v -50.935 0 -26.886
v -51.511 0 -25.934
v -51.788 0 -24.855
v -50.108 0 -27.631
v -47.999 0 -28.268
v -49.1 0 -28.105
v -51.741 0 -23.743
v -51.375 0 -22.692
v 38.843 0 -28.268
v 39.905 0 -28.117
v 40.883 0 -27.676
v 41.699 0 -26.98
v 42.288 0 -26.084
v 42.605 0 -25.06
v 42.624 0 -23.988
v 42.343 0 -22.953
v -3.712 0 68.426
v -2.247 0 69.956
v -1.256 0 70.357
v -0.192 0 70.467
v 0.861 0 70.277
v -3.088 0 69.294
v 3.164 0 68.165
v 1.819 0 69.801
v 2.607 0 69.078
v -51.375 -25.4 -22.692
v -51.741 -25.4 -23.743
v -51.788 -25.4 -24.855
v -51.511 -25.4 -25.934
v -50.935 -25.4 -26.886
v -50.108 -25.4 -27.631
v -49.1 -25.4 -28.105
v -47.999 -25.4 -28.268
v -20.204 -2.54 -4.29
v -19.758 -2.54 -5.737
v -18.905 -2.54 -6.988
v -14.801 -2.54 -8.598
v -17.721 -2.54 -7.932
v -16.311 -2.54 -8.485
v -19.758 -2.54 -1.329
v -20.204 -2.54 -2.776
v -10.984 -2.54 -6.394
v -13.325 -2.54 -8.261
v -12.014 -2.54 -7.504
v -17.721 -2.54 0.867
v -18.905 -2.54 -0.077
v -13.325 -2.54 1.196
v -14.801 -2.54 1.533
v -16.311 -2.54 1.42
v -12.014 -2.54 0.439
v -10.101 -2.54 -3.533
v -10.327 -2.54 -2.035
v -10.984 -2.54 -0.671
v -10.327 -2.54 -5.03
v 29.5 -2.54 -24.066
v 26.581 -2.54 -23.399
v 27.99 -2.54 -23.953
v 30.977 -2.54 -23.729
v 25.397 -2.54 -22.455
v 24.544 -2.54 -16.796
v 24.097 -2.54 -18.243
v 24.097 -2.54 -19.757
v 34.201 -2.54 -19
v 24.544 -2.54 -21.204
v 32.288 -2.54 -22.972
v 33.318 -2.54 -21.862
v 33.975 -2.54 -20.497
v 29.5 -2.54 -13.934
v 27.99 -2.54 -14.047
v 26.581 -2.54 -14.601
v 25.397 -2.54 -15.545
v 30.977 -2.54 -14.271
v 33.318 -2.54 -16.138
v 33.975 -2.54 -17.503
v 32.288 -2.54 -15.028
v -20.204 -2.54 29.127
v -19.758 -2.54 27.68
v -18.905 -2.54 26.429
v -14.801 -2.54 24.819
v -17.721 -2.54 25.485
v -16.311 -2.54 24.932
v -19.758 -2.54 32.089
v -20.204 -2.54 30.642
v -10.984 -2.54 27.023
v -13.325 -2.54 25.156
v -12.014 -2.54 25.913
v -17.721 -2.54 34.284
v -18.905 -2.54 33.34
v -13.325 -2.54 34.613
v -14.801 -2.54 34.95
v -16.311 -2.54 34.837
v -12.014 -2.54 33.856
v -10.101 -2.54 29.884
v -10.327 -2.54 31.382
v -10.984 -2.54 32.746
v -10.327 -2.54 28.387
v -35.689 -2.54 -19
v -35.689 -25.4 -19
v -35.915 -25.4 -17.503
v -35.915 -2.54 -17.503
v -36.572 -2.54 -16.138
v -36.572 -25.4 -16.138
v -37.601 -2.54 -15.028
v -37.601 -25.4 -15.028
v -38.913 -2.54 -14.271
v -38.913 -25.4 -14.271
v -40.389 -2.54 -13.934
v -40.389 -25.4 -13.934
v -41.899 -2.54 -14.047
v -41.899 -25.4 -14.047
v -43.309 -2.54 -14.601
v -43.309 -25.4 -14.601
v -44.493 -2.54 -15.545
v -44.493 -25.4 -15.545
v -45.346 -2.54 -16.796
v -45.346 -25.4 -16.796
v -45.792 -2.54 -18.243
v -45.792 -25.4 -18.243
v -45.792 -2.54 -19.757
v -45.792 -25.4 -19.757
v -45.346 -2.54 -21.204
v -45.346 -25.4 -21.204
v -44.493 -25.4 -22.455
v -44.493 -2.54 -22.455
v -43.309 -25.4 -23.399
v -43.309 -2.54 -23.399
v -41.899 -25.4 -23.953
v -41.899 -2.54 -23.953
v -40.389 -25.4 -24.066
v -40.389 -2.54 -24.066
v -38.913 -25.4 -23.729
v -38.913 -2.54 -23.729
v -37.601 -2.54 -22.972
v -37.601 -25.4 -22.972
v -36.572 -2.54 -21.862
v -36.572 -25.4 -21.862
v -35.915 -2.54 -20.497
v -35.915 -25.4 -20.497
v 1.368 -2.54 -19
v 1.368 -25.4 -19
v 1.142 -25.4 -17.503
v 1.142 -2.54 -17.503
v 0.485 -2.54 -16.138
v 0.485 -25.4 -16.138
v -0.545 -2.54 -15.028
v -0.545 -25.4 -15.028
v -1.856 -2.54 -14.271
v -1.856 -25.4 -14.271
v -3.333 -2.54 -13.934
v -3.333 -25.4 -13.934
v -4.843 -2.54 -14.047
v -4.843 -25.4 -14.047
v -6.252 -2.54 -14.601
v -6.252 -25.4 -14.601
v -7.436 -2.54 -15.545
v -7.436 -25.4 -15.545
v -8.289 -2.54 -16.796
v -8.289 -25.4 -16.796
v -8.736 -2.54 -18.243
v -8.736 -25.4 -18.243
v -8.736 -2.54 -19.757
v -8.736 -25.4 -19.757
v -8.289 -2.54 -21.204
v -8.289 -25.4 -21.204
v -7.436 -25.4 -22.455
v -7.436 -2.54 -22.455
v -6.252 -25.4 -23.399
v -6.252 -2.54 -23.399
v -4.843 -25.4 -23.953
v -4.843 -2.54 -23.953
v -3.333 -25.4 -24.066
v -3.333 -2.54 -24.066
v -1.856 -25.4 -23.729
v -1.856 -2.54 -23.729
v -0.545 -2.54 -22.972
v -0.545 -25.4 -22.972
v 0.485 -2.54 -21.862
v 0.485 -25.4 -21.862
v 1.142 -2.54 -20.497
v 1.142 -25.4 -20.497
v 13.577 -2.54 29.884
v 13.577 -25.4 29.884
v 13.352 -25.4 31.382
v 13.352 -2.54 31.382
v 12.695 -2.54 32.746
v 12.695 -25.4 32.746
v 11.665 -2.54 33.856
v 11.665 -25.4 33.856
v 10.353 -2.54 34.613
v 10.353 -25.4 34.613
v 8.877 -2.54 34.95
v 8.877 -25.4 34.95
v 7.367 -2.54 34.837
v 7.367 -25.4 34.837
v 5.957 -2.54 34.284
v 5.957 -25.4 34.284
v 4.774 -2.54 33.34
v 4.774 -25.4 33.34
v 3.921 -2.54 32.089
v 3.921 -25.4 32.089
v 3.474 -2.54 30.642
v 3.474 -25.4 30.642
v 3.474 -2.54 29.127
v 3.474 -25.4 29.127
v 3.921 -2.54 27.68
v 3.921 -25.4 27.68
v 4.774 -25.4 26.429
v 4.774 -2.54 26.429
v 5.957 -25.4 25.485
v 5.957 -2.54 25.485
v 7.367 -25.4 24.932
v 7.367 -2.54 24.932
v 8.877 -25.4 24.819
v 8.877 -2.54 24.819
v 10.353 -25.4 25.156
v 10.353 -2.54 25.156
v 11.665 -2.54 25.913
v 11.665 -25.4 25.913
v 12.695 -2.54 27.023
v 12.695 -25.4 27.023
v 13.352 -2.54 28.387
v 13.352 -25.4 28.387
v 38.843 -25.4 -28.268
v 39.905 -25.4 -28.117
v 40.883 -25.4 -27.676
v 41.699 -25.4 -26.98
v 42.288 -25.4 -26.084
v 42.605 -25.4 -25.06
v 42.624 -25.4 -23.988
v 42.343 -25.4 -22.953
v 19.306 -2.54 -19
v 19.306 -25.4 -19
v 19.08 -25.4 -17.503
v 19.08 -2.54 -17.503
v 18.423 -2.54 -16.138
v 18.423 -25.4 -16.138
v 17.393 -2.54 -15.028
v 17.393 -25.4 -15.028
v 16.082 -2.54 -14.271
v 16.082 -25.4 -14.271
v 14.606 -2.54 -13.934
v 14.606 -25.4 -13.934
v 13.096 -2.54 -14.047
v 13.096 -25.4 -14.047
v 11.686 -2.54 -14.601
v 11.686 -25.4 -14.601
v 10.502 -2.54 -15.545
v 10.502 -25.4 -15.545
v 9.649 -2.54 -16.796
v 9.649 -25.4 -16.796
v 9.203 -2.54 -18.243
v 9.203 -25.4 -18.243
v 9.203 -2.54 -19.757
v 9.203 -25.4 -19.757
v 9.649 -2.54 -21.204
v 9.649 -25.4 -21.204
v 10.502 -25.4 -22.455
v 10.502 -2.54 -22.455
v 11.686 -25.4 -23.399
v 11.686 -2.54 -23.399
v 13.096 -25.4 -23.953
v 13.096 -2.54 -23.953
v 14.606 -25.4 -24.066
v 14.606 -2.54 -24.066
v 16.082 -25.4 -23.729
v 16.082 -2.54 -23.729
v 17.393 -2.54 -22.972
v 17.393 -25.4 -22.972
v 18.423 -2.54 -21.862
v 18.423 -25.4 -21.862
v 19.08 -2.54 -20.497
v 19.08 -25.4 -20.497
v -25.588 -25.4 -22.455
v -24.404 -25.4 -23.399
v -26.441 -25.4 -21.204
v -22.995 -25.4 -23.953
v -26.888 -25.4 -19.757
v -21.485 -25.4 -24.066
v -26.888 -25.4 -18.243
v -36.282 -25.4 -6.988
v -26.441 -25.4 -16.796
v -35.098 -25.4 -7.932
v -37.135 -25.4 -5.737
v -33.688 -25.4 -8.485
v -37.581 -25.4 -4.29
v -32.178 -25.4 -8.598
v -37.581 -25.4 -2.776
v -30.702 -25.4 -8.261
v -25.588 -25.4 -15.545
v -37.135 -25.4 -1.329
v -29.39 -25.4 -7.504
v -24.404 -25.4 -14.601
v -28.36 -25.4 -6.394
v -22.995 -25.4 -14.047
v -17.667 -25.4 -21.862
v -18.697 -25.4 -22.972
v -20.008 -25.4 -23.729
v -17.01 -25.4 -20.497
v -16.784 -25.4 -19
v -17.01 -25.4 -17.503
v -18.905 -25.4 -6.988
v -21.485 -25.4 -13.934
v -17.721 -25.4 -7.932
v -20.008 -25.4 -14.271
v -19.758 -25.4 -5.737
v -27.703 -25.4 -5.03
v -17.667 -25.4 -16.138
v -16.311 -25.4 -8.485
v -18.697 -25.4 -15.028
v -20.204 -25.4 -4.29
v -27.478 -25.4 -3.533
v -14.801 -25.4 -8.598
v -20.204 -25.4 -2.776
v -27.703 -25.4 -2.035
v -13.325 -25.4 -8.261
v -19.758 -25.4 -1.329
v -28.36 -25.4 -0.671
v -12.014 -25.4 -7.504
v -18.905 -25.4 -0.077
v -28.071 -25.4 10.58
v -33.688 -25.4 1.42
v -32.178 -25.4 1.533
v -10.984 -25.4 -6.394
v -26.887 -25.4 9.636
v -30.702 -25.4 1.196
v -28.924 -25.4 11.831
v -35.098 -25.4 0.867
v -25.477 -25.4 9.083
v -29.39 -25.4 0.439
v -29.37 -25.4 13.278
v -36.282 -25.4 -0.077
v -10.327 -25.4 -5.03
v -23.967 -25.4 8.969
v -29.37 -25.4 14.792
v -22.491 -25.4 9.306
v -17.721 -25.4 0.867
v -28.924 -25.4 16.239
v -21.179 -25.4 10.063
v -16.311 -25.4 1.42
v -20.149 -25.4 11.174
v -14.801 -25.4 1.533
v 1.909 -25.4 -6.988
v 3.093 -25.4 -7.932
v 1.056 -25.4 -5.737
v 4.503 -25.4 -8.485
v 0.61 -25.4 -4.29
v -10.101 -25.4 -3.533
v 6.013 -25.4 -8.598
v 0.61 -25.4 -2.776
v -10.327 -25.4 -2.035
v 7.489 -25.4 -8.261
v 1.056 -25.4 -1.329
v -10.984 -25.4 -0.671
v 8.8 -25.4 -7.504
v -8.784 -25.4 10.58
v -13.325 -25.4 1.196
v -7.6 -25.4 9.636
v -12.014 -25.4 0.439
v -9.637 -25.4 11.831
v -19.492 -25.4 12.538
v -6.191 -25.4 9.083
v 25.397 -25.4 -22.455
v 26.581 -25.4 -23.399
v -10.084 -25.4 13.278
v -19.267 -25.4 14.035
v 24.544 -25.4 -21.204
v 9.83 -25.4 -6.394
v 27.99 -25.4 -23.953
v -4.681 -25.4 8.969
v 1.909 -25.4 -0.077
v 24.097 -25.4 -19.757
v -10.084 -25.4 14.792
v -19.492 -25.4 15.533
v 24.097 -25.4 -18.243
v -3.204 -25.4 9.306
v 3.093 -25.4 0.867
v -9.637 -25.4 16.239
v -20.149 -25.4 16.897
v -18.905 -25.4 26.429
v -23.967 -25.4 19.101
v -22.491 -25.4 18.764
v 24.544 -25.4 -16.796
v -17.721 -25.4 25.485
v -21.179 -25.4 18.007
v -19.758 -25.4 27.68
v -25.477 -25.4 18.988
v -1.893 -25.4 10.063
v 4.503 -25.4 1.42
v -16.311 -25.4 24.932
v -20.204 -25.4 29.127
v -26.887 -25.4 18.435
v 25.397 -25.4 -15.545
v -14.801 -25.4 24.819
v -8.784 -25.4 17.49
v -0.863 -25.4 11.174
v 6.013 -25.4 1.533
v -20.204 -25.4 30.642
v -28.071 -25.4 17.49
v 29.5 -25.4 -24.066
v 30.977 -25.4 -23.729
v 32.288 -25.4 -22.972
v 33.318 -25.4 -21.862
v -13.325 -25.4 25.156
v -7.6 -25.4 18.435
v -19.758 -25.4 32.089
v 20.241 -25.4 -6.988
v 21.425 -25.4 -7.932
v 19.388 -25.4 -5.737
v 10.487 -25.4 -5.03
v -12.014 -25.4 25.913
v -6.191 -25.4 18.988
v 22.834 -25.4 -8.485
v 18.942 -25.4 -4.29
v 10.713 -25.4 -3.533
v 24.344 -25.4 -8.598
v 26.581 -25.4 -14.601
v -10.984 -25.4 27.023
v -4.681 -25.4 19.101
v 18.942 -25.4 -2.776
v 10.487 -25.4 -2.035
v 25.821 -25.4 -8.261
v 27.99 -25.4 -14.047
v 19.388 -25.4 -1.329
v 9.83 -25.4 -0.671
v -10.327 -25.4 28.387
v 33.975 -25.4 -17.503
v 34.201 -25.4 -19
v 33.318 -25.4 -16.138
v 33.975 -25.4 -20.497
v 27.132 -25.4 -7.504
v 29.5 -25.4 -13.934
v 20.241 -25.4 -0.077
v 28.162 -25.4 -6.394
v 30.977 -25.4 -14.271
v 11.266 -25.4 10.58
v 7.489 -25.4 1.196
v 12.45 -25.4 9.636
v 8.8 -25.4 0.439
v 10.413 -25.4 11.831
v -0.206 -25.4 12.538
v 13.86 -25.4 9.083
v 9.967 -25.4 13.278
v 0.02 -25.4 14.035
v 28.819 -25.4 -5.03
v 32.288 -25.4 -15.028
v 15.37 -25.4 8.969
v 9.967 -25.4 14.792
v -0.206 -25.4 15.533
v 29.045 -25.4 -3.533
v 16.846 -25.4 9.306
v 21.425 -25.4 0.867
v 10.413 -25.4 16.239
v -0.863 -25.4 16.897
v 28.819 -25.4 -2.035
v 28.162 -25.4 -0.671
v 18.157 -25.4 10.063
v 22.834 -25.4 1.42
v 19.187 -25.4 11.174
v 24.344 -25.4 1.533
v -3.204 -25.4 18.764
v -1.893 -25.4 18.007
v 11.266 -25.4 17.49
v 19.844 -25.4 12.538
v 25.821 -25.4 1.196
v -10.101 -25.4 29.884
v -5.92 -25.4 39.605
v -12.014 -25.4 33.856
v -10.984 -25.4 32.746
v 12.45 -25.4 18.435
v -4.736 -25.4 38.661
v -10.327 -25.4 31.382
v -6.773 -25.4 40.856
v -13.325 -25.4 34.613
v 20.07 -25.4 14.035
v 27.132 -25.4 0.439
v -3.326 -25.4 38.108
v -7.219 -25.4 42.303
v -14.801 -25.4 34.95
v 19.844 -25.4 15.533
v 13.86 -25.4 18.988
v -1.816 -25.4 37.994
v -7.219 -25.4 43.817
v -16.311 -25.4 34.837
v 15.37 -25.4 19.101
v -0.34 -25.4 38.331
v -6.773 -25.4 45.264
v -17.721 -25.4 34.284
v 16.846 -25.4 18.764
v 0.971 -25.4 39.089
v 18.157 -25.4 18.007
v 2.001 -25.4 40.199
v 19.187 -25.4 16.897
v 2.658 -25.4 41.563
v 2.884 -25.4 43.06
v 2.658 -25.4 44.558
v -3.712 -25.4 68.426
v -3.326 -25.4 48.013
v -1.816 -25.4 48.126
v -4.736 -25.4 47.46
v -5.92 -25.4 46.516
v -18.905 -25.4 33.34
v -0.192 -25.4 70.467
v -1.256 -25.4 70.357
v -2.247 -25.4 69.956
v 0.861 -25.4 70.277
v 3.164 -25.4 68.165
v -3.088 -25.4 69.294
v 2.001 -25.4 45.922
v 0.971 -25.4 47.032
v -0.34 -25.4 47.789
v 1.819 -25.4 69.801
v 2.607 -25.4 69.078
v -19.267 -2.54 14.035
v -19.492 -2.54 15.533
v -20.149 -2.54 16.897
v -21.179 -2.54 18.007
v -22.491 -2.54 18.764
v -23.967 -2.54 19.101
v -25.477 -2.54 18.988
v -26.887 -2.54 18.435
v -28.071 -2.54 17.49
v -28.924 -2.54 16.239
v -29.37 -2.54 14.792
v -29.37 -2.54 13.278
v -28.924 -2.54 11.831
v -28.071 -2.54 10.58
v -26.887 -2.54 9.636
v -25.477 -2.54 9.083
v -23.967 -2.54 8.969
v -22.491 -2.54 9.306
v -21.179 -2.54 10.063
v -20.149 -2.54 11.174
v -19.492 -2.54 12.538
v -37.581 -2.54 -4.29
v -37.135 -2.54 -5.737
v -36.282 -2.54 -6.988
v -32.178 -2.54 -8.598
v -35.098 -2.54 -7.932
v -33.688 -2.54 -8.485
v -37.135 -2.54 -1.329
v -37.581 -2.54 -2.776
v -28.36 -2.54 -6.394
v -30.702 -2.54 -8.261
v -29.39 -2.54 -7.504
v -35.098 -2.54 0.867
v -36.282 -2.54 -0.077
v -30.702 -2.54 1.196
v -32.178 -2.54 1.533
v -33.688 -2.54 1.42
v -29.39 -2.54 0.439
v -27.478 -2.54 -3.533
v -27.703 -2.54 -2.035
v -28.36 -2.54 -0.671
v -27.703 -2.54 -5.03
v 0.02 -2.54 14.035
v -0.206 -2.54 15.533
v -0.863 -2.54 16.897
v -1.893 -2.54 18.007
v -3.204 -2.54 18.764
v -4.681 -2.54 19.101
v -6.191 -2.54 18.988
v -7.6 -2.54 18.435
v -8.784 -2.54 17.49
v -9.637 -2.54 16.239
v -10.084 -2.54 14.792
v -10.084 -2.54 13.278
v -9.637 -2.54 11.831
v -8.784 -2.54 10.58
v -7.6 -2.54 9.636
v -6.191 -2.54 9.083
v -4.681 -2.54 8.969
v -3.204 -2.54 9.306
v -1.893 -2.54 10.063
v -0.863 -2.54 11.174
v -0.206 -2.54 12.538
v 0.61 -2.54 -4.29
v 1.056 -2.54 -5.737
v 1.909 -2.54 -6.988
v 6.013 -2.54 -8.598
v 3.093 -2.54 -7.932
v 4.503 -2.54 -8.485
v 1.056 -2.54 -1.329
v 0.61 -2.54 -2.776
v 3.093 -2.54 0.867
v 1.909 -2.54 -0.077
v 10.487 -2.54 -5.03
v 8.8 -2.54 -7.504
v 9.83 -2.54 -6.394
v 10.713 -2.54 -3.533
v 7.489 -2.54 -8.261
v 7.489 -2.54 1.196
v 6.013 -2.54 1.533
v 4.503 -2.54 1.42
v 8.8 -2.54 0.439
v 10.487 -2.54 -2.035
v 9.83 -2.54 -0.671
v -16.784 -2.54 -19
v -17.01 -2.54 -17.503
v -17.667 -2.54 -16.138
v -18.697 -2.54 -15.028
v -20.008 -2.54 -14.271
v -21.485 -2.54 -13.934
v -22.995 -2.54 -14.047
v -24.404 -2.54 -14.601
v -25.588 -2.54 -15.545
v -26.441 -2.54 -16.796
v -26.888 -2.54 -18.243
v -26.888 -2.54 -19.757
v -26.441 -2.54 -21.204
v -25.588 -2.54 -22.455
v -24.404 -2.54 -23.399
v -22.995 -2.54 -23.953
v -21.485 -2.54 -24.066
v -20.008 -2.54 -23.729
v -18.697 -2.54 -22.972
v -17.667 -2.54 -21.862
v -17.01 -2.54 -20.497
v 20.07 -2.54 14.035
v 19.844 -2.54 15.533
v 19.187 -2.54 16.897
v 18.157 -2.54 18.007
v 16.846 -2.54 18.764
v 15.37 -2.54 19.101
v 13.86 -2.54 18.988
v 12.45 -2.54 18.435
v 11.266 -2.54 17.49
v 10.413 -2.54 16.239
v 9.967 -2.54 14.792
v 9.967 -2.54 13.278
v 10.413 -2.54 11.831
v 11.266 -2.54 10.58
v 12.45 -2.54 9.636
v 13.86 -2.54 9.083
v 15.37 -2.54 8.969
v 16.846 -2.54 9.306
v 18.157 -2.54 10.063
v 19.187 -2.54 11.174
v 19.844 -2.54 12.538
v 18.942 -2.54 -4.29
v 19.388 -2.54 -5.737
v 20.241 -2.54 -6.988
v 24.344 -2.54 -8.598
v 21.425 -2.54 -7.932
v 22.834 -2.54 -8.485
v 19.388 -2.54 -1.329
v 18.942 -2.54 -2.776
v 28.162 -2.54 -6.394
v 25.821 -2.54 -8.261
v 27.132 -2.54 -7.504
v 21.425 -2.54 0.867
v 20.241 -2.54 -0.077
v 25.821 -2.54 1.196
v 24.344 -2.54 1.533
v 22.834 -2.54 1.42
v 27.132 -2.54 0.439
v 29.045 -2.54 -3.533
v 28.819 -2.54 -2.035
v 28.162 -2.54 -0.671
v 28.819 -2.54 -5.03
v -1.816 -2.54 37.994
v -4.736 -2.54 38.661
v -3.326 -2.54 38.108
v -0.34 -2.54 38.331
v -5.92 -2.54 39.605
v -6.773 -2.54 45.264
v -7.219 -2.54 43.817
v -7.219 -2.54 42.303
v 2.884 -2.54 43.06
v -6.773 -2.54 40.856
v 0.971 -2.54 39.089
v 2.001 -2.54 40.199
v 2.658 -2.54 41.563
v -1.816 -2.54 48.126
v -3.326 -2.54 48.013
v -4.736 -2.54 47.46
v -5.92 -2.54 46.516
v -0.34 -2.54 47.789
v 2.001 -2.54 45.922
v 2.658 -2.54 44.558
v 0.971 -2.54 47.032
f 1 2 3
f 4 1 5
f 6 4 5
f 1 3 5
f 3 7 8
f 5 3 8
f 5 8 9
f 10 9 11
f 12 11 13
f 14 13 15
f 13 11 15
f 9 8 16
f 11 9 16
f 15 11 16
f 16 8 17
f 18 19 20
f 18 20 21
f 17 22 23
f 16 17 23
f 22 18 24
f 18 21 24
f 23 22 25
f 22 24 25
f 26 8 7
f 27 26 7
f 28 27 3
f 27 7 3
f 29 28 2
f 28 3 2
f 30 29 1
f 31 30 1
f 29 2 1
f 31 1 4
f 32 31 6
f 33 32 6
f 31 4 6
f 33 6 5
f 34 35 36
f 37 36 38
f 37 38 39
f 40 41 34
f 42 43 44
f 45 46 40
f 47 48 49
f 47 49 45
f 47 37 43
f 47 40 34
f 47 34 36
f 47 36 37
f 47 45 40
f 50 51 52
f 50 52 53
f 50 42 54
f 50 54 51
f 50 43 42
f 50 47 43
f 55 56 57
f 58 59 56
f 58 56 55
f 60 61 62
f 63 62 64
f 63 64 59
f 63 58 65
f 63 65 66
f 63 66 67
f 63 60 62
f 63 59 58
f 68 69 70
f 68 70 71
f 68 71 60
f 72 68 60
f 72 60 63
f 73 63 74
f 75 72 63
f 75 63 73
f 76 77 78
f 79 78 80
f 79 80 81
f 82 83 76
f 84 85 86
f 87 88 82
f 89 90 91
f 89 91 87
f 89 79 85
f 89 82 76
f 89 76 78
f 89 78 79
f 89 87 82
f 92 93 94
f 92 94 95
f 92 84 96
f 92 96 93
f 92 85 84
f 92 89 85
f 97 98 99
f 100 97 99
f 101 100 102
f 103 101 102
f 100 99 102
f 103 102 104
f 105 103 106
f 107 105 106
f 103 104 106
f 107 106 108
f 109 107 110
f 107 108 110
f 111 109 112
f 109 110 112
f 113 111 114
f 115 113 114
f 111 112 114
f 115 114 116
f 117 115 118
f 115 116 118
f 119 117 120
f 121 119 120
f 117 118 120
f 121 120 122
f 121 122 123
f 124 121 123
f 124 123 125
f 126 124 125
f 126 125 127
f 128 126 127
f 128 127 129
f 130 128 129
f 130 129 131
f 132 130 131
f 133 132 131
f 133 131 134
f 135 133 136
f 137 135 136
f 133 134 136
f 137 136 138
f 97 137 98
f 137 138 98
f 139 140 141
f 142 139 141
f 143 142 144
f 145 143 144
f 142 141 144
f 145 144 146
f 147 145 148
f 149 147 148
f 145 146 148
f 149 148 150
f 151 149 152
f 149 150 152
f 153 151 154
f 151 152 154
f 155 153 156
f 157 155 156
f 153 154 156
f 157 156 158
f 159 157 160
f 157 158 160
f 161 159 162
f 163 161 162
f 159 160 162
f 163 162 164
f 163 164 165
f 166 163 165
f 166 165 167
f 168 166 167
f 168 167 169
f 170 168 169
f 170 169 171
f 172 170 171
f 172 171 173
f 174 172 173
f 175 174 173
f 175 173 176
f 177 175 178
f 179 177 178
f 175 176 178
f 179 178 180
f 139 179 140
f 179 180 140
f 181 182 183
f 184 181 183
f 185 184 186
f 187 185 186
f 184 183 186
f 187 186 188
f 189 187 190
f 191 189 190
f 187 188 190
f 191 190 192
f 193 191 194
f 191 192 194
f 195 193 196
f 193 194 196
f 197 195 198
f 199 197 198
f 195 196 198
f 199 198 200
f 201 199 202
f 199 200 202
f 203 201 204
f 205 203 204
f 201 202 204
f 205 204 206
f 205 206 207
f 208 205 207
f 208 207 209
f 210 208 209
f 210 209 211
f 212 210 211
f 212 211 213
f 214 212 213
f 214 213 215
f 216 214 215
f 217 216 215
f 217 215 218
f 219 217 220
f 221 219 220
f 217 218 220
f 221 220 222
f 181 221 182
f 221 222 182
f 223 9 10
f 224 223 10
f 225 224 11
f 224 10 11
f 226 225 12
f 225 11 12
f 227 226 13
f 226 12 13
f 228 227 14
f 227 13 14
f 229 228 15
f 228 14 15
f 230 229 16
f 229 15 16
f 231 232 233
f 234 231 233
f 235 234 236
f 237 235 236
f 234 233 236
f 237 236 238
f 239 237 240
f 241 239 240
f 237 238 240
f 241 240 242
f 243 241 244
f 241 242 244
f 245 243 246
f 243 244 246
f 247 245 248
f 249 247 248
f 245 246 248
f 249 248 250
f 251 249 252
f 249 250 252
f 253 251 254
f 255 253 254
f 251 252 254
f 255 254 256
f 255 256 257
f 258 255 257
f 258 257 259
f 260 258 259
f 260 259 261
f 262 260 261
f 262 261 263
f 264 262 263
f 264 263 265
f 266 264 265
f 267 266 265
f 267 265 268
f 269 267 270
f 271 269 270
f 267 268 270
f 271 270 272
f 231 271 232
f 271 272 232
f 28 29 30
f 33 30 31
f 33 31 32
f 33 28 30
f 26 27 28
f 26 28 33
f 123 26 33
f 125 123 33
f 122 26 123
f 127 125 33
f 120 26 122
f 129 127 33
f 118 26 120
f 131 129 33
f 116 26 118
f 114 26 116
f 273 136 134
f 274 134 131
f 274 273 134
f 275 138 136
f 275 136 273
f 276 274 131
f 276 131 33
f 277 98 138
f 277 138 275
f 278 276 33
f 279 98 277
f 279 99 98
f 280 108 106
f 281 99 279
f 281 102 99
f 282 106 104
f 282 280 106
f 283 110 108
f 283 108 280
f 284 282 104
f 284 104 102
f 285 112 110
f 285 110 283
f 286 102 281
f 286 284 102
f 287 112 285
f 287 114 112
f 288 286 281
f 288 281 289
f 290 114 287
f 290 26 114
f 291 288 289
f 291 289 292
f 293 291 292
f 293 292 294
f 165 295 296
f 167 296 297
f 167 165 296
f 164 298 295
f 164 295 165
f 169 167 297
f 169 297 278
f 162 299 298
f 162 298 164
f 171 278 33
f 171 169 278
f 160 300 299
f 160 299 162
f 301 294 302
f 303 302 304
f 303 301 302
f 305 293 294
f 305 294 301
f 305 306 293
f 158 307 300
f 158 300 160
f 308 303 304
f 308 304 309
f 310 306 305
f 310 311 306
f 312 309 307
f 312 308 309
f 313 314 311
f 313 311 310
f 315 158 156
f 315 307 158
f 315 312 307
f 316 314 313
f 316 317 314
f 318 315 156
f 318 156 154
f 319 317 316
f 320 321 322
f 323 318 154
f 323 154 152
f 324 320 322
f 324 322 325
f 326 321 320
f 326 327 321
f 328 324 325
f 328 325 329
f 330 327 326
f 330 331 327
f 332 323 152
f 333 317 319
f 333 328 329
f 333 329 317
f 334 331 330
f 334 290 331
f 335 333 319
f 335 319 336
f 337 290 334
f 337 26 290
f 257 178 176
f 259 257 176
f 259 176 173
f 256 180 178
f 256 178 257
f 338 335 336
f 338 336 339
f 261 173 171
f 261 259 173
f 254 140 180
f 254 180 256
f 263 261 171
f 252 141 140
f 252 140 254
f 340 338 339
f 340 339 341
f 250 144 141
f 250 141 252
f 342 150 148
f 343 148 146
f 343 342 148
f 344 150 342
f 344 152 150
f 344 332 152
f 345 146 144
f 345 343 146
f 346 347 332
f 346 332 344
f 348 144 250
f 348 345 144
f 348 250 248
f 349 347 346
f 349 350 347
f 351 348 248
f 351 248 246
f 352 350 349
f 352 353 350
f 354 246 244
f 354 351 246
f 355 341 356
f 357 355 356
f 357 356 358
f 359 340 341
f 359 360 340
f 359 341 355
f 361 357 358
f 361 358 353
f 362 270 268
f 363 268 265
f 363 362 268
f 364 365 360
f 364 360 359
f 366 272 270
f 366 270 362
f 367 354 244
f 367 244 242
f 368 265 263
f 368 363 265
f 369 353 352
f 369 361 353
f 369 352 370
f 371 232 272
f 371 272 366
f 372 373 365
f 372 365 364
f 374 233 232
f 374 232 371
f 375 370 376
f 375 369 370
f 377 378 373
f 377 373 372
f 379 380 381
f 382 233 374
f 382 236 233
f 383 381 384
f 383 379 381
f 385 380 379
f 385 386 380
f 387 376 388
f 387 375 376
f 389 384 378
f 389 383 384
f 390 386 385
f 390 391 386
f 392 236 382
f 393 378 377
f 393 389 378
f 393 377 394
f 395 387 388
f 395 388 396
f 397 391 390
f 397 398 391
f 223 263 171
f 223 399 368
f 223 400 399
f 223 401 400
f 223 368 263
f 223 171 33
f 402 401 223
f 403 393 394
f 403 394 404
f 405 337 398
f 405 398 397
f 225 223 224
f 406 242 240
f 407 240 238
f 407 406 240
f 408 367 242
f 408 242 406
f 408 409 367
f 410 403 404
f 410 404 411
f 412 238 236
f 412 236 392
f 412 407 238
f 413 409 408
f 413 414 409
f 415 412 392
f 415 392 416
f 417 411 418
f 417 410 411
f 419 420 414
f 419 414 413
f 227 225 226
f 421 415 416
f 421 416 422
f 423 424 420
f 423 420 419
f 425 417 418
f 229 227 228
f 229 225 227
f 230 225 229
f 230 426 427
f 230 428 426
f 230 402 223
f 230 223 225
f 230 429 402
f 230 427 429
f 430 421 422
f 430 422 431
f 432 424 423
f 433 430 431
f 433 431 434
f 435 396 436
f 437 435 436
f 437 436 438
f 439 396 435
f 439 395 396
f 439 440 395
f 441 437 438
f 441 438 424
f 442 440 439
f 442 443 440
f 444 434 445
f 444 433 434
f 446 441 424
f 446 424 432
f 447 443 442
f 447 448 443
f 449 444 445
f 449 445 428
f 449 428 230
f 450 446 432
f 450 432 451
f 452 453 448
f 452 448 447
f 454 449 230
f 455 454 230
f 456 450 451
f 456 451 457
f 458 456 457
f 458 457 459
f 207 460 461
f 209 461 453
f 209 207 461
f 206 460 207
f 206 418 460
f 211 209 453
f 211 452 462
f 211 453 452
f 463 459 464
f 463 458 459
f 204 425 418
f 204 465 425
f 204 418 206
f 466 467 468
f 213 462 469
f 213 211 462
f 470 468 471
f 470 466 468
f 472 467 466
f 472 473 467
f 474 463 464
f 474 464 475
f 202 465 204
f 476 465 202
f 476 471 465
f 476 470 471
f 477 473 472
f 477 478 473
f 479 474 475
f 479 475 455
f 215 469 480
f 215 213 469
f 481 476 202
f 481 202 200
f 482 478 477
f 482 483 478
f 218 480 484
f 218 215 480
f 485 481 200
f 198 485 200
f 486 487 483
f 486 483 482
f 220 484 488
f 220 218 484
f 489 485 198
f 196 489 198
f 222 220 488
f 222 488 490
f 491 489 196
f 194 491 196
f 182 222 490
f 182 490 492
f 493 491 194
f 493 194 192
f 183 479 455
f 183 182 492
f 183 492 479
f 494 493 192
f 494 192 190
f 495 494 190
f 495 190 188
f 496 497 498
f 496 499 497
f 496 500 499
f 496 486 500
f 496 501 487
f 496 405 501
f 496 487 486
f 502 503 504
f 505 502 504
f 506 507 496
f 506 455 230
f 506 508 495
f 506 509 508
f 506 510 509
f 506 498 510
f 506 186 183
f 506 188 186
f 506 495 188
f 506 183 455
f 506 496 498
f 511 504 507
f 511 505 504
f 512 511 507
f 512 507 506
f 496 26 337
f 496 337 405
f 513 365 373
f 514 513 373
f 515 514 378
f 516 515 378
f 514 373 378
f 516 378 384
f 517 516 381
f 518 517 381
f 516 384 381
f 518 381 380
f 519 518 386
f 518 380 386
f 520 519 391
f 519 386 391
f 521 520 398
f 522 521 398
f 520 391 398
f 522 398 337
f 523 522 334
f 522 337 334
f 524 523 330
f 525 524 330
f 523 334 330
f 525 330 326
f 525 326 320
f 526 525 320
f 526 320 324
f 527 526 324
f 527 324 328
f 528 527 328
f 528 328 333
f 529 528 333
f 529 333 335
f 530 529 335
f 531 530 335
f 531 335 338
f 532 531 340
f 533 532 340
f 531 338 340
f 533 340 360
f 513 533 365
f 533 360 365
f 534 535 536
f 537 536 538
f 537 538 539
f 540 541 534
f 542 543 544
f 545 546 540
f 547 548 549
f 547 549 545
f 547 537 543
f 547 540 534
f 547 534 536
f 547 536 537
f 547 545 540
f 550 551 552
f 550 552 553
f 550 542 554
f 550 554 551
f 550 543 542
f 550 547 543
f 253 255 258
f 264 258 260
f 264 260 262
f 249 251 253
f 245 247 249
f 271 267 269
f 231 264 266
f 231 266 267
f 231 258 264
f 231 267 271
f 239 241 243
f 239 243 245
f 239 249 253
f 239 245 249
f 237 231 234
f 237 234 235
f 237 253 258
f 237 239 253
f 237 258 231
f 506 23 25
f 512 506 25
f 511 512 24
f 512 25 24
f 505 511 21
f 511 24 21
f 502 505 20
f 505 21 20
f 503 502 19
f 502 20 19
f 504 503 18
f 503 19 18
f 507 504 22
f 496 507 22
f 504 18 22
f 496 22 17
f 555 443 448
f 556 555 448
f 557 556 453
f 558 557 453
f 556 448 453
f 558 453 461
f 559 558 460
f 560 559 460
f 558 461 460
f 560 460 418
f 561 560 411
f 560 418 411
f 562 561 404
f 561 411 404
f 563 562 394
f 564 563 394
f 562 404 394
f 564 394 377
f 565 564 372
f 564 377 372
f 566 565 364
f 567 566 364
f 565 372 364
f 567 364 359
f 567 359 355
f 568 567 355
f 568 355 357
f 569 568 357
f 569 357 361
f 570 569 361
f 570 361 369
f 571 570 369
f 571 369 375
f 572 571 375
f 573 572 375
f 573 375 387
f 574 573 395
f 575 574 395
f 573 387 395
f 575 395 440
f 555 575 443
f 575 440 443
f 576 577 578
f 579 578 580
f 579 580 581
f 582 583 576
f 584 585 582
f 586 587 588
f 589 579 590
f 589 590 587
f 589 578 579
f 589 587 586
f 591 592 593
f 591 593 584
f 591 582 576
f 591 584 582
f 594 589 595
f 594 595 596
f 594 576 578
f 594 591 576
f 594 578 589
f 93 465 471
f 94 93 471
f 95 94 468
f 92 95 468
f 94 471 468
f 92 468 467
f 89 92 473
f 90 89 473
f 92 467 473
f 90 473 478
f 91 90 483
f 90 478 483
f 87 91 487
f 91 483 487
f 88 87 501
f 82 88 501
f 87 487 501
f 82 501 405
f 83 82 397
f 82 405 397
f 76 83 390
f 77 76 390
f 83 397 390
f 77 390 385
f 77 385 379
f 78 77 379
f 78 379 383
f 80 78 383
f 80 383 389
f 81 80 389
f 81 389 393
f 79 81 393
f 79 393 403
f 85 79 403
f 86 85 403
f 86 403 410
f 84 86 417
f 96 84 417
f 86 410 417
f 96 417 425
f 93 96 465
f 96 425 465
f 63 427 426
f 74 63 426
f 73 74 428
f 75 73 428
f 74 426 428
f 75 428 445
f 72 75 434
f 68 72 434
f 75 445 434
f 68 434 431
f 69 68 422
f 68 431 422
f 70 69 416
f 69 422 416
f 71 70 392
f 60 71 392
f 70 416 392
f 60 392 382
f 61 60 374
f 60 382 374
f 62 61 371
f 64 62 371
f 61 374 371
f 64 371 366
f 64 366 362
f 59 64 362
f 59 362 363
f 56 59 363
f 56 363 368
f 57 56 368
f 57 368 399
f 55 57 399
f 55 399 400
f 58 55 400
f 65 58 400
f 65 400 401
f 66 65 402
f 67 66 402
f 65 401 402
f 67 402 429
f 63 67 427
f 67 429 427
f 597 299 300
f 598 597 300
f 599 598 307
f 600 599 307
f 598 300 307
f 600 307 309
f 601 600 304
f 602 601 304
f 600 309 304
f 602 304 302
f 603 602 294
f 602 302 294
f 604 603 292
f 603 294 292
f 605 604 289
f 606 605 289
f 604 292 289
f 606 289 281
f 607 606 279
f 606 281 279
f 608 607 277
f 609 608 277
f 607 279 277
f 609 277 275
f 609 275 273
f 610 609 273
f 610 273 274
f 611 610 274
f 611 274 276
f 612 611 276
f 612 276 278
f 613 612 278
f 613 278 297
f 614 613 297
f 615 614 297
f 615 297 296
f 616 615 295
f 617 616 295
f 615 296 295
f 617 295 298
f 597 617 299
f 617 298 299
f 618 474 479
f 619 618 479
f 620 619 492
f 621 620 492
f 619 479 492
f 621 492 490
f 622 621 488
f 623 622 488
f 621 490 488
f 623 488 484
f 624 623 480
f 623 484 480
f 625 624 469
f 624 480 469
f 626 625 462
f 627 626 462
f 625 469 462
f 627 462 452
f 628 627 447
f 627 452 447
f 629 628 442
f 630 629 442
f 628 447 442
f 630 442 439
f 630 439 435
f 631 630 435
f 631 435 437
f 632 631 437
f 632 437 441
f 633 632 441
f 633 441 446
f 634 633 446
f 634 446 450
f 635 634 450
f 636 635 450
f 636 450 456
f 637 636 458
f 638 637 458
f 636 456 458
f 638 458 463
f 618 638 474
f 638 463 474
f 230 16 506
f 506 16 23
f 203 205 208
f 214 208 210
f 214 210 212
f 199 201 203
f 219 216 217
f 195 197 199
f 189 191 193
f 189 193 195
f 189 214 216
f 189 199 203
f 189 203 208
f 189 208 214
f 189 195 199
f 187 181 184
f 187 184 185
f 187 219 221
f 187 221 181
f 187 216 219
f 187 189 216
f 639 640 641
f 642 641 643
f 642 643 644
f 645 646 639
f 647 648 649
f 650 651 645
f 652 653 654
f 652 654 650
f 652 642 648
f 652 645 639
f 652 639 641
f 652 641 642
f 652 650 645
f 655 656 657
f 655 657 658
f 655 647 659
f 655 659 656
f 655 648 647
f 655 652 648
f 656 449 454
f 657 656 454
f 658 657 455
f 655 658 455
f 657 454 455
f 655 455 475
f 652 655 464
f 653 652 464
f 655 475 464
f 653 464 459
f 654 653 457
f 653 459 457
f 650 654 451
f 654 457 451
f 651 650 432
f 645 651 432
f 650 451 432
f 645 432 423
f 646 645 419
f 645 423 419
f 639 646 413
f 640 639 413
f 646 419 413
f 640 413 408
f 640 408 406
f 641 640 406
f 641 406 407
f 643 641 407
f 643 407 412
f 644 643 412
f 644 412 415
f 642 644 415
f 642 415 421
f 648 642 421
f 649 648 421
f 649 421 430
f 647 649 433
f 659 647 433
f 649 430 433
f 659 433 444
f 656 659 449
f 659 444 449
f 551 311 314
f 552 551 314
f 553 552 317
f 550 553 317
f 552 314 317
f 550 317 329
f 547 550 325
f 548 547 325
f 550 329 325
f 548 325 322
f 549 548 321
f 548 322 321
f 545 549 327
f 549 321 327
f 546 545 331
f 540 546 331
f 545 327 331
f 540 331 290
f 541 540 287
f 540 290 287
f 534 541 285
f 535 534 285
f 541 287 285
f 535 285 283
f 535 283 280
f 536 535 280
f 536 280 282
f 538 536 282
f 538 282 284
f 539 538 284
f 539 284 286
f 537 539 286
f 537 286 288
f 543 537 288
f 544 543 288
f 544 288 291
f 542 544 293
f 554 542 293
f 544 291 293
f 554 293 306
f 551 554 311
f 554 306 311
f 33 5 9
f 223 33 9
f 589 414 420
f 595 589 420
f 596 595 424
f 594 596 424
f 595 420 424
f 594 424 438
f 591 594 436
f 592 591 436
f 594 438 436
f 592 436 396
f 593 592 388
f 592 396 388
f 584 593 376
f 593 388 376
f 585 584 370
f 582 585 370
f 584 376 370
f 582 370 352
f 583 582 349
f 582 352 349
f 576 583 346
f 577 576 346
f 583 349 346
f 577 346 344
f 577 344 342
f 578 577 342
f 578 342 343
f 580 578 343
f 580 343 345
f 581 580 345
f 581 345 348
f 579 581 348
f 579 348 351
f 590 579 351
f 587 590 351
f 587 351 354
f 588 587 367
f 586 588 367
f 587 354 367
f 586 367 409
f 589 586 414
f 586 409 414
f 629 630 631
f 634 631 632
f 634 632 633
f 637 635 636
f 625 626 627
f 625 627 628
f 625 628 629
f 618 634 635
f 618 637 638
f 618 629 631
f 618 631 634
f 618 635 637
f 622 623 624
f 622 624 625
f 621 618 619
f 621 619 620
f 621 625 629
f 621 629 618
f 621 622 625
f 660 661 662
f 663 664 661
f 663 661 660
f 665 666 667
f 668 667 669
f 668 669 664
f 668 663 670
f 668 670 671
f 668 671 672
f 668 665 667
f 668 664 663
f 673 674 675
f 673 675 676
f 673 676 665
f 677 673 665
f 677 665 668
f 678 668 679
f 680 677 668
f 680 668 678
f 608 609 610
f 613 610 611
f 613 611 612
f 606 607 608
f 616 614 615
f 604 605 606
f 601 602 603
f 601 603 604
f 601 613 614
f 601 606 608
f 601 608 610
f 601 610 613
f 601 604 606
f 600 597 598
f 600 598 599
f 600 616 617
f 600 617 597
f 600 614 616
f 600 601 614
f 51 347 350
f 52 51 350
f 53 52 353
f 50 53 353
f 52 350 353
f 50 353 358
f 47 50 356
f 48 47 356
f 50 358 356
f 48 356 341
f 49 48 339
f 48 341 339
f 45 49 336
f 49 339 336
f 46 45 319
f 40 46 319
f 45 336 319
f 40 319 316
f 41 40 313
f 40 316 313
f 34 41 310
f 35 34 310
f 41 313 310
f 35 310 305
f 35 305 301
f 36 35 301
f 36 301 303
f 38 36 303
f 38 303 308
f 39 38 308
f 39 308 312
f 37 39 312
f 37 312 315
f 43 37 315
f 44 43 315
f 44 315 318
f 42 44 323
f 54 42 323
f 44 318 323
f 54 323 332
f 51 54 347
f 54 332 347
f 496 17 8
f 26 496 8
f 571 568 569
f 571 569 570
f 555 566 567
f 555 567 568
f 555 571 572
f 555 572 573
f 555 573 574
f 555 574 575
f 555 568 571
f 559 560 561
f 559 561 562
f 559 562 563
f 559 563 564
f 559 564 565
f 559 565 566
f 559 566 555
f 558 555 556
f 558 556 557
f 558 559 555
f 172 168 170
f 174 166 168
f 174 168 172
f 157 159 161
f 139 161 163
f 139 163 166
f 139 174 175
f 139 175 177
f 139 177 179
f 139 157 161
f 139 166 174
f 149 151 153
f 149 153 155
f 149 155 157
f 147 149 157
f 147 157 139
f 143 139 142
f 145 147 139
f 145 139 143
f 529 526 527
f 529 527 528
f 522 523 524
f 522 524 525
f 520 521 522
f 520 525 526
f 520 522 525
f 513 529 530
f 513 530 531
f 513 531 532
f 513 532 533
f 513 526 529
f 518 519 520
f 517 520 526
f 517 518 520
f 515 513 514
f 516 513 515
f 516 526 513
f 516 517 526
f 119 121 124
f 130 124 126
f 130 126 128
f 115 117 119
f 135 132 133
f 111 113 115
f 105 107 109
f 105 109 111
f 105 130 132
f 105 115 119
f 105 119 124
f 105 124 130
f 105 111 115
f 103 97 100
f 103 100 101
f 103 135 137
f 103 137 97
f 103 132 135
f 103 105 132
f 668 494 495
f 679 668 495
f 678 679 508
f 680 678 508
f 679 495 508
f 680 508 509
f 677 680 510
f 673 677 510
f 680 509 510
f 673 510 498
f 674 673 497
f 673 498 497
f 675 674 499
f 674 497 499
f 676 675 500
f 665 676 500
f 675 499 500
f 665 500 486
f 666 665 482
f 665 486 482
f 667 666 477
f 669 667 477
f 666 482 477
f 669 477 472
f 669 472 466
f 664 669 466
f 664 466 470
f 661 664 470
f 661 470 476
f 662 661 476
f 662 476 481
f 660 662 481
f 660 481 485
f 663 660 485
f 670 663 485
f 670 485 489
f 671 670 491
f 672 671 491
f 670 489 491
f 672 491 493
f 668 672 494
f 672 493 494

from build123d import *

# Parameters (mm, degrees)
F1_DEPTH = 25.4
F2_R     = 5.08
F3_DEPTH = 22.86


with BuildPart() as f1:
    # F0 (on Front) → F1 (new body)
    with BuildSketch(Plane.XZ):
        with BuildLine():
            ThreePointArc((3.163813, 68.164682), (-0.191852, 70.466917), (-3.712345, 68.425619))
            Line((-3.712345, 68.425619), (-51.374926, -22.691637))
            ThreePointArc((-51.374926, -22.691637), (-51.258083, -26.430894), (-47.998911, -28.267599))
            Line((-47.998911, -28.267599), (38.843141, -28.267599))
            ThreePointArc((38.843141, -28.267599), (42.025141, -26.553065), (42.343284, -22.952574))
            Line((42.343284, -22.952574), (3.163813, 68.164682))
        make_face()
    extrude(amount=F1_DEPTH)

    # F2 (on face) → F3 (cut)
    with BuildSketch(Plane.XZ.offset(25.4)):
        with Locations((-24.346719, 14.035167)):
            Circle(F2_R)
        with Locations((-15.180895, 29.884405)):
            Circle(F2_R)
        with Locations((-2.195979, 43.060273)):
            Circle(F2_R)
        with Locations((-3.712345, -18.999988)):
            Circle(F2_R)
        with Locations((14.226123, -18.999988)):
            Circle(F2_R)
        with Locations((29.120583, -18.999988)):
            Circle(F2_R)
        with Locations((-21.864308, -18.999988)):
            Circle(F2_R)
        with Locations((-40.768821, -18.999988)):
            Circle(F2_R)
        with Locations((-32.557767, -3.532661)):
            Circle(F2_R)
        with Locations((-15.180895, -3.532661)):
            Circle(F2_R)
        with Locations((5.633163, -3.532661)):
            Circle(F2_R)
        with Locations((23.964809, -3.532661)):
            Circle(F2_R)
        with Locations((14.989941, 14.035167)):
            Circle(F2_R)
        with Locations((-5.060299, 14.035167)):
            Circle(F2_R)
        with Locations((8.497481, 29.884405)):
            Circle(F2_R)
    extrude(amount=-F3_DEPTH, mode=Mode.SUBTRACT)


solid = f1.part
